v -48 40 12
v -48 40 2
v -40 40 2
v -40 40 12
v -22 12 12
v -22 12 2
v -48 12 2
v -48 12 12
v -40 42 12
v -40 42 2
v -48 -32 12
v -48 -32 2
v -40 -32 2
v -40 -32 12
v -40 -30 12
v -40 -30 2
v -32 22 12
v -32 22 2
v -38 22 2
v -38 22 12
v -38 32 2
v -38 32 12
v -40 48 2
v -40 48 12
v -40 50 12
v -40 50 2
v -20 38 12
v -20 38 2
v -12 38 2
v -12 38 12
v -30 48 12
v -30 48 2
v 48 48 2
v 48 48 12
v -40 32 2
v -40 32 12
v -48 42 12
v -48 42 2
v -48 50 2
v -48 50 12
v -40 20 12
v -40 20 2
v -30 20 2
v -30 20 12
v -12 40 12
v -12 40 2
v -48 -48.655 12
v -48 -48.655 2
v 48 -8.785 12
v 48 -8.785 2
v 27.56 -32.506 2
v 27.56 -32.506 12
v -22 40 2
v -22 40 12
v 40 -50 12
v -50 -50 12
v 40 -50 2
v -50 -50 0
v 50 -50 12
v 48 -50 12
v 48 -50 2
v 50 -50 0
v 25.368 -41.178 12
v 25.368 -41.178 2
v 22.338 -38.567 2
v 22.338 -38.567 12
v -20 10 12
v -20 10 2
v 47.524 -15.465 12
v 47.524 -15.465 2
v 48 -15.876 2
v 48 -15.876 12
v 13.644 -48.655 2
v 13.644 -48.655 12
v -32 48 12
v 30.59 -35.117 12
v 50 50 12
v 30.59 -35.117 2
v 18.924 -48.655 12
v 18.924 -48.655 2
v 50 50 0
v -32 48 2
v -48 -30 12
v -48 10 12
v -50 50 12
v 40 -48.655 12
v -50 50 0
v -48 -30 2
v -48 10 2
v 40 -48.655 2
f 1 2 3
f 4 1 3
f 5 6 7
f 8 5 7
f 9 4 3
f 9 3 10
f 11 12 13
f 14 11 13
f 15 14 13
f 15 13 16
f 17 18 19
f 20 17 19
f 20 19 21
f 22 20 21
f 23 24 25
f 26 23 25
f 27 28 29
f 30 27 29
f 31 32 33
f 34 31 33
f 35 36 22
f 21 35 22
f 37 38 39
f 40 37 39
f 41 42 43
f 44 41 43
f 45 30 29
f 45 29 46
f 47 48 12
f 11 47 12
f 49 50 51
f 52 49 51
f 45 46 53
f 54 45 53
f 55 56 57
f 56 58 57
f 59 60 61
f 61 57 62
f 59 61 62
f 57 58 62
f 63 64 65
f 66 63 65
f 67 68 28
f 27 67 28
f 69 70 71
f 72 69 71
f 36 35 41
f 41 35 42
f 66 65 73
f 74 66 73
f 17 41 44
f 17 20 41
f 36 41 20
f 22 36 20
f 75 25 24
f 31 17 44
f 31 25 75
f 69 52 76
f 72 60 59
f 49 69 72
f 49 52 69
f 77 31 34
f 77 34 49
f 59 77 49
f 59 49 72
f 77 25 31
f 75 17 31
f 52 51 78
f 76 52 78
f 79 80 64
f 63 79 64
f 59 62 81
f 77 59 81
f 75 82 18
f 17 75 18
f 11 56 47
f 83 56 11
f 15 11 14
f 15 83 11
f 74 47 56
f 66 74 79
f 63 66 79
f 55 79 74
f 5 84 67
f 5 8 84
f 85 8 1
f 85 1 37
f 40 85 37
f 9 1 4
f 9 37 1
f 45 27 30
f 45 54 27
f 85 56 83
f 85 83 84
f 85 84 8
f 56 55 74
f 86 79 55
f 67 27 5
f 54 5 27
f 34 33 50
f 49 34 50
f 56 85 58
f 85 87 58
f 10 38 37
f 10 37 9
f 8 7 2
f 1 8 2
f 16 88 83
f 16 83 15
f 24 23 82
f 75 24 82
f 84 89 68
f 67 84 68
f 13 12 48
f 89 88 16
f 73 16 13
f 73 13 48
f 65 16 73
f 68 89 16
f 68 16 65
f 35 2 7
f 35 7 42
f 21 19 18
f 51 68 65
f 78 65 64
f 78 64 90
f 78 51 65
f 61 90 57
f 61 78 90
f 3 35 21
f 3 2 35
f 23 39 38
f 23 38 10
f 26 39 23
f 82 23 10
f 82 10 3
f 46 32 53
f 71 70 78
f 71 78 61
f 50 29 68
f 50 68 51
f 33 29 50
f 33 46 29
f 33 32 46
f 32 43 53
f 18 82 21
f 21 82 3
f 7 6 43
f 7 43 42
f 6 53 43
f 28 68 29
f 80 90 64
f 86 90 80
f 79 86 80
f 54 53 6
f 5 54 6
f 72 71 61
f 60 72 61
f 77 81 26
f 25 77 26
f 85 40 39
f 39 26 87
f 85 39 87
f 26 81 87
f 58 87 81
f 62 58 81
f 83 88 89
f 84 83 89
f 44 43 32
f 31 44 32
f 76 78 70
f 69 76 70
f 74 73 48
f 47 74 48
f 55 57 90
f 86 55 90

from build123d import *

# Parameters (mm, degrees)
F0_W     = 100
F0_H     = 100
F1_DEPTH = 2
F2_W     = 2
F2_H     = 2
F2_W_2   = 8
F2_H_2   = 10
F3_DEPTH = 10


with BuildPart() as f1:
    # F0 (on Top) → F1 (new body)
    with BuildSketch(Plane.XY):
        Rectangle(F0_W, F0_H)
    extrude(amount=F1_DEPTH)

    # F2 (on face) → F3 (join)
    with BuildSketch(Plane.XY.offset(2)):
        Polygon((-48, 50), (-50, 50), (-50, -30), (-48, -30), (-48, 10), (-48, 12), (-48, 40), (-48, 42), align=None)
        with Locations((-49, -31)):
            Rectangle(F2_W, F2_H)
        with Locations((-44, 41)):
            Rectangle(F2_W_2, F2_H)
        Polygon((-48, -32), (-50, -32), (-50, -50), (-48, -50), (-48, -48.655497), align=None)
        with Locations((-44, -31)):
            Rectangle(F2_W_2, F2_H)
        Polygon((-48, 12), (-48, 10), (-20, 10), (-20, 38), (-12, 38), (-12, 40), (-22, 40), (-22, 12), align=None)
        Polygon((-48, -48.655497), (-48, -50), (40, -50), (40, -48.655497), (18.924282, -48.655497), (13.644133, -48.655497), align=None)
        Polygon((22.337581, -38.566588), (13.644133, -48.655497), (18.924282, -48.655497), (25.367798, -41.177677), align=None)
        Polygon((48, -15.875603), (48, -50), (50, -50), (50, 50), (-30, 50), (-30, 48), (48, 48), (48, -8.784876), align=None)
        Polygon((47.523779, -15.465251), (48, -15.875603), (48, -8.784876), (27.559759, -32.506154), (30.589976, -35.117243), align=None)
        Polygon((-30, 48), (-30, 50), (-32, 50), (-32, 48), (-32, 22), (-38, 22), (-40, 22), (-40, 20), (-30, 20), align=None)
        with Locations((-36, 49)):
            Rectangle(F2_W_2, F2_H)
        with Locations((-39, 27)):
            Rectangle(F2_W, F2_H_2)
    extrude(amount=F3_DEPTH)


solid = f1.part
